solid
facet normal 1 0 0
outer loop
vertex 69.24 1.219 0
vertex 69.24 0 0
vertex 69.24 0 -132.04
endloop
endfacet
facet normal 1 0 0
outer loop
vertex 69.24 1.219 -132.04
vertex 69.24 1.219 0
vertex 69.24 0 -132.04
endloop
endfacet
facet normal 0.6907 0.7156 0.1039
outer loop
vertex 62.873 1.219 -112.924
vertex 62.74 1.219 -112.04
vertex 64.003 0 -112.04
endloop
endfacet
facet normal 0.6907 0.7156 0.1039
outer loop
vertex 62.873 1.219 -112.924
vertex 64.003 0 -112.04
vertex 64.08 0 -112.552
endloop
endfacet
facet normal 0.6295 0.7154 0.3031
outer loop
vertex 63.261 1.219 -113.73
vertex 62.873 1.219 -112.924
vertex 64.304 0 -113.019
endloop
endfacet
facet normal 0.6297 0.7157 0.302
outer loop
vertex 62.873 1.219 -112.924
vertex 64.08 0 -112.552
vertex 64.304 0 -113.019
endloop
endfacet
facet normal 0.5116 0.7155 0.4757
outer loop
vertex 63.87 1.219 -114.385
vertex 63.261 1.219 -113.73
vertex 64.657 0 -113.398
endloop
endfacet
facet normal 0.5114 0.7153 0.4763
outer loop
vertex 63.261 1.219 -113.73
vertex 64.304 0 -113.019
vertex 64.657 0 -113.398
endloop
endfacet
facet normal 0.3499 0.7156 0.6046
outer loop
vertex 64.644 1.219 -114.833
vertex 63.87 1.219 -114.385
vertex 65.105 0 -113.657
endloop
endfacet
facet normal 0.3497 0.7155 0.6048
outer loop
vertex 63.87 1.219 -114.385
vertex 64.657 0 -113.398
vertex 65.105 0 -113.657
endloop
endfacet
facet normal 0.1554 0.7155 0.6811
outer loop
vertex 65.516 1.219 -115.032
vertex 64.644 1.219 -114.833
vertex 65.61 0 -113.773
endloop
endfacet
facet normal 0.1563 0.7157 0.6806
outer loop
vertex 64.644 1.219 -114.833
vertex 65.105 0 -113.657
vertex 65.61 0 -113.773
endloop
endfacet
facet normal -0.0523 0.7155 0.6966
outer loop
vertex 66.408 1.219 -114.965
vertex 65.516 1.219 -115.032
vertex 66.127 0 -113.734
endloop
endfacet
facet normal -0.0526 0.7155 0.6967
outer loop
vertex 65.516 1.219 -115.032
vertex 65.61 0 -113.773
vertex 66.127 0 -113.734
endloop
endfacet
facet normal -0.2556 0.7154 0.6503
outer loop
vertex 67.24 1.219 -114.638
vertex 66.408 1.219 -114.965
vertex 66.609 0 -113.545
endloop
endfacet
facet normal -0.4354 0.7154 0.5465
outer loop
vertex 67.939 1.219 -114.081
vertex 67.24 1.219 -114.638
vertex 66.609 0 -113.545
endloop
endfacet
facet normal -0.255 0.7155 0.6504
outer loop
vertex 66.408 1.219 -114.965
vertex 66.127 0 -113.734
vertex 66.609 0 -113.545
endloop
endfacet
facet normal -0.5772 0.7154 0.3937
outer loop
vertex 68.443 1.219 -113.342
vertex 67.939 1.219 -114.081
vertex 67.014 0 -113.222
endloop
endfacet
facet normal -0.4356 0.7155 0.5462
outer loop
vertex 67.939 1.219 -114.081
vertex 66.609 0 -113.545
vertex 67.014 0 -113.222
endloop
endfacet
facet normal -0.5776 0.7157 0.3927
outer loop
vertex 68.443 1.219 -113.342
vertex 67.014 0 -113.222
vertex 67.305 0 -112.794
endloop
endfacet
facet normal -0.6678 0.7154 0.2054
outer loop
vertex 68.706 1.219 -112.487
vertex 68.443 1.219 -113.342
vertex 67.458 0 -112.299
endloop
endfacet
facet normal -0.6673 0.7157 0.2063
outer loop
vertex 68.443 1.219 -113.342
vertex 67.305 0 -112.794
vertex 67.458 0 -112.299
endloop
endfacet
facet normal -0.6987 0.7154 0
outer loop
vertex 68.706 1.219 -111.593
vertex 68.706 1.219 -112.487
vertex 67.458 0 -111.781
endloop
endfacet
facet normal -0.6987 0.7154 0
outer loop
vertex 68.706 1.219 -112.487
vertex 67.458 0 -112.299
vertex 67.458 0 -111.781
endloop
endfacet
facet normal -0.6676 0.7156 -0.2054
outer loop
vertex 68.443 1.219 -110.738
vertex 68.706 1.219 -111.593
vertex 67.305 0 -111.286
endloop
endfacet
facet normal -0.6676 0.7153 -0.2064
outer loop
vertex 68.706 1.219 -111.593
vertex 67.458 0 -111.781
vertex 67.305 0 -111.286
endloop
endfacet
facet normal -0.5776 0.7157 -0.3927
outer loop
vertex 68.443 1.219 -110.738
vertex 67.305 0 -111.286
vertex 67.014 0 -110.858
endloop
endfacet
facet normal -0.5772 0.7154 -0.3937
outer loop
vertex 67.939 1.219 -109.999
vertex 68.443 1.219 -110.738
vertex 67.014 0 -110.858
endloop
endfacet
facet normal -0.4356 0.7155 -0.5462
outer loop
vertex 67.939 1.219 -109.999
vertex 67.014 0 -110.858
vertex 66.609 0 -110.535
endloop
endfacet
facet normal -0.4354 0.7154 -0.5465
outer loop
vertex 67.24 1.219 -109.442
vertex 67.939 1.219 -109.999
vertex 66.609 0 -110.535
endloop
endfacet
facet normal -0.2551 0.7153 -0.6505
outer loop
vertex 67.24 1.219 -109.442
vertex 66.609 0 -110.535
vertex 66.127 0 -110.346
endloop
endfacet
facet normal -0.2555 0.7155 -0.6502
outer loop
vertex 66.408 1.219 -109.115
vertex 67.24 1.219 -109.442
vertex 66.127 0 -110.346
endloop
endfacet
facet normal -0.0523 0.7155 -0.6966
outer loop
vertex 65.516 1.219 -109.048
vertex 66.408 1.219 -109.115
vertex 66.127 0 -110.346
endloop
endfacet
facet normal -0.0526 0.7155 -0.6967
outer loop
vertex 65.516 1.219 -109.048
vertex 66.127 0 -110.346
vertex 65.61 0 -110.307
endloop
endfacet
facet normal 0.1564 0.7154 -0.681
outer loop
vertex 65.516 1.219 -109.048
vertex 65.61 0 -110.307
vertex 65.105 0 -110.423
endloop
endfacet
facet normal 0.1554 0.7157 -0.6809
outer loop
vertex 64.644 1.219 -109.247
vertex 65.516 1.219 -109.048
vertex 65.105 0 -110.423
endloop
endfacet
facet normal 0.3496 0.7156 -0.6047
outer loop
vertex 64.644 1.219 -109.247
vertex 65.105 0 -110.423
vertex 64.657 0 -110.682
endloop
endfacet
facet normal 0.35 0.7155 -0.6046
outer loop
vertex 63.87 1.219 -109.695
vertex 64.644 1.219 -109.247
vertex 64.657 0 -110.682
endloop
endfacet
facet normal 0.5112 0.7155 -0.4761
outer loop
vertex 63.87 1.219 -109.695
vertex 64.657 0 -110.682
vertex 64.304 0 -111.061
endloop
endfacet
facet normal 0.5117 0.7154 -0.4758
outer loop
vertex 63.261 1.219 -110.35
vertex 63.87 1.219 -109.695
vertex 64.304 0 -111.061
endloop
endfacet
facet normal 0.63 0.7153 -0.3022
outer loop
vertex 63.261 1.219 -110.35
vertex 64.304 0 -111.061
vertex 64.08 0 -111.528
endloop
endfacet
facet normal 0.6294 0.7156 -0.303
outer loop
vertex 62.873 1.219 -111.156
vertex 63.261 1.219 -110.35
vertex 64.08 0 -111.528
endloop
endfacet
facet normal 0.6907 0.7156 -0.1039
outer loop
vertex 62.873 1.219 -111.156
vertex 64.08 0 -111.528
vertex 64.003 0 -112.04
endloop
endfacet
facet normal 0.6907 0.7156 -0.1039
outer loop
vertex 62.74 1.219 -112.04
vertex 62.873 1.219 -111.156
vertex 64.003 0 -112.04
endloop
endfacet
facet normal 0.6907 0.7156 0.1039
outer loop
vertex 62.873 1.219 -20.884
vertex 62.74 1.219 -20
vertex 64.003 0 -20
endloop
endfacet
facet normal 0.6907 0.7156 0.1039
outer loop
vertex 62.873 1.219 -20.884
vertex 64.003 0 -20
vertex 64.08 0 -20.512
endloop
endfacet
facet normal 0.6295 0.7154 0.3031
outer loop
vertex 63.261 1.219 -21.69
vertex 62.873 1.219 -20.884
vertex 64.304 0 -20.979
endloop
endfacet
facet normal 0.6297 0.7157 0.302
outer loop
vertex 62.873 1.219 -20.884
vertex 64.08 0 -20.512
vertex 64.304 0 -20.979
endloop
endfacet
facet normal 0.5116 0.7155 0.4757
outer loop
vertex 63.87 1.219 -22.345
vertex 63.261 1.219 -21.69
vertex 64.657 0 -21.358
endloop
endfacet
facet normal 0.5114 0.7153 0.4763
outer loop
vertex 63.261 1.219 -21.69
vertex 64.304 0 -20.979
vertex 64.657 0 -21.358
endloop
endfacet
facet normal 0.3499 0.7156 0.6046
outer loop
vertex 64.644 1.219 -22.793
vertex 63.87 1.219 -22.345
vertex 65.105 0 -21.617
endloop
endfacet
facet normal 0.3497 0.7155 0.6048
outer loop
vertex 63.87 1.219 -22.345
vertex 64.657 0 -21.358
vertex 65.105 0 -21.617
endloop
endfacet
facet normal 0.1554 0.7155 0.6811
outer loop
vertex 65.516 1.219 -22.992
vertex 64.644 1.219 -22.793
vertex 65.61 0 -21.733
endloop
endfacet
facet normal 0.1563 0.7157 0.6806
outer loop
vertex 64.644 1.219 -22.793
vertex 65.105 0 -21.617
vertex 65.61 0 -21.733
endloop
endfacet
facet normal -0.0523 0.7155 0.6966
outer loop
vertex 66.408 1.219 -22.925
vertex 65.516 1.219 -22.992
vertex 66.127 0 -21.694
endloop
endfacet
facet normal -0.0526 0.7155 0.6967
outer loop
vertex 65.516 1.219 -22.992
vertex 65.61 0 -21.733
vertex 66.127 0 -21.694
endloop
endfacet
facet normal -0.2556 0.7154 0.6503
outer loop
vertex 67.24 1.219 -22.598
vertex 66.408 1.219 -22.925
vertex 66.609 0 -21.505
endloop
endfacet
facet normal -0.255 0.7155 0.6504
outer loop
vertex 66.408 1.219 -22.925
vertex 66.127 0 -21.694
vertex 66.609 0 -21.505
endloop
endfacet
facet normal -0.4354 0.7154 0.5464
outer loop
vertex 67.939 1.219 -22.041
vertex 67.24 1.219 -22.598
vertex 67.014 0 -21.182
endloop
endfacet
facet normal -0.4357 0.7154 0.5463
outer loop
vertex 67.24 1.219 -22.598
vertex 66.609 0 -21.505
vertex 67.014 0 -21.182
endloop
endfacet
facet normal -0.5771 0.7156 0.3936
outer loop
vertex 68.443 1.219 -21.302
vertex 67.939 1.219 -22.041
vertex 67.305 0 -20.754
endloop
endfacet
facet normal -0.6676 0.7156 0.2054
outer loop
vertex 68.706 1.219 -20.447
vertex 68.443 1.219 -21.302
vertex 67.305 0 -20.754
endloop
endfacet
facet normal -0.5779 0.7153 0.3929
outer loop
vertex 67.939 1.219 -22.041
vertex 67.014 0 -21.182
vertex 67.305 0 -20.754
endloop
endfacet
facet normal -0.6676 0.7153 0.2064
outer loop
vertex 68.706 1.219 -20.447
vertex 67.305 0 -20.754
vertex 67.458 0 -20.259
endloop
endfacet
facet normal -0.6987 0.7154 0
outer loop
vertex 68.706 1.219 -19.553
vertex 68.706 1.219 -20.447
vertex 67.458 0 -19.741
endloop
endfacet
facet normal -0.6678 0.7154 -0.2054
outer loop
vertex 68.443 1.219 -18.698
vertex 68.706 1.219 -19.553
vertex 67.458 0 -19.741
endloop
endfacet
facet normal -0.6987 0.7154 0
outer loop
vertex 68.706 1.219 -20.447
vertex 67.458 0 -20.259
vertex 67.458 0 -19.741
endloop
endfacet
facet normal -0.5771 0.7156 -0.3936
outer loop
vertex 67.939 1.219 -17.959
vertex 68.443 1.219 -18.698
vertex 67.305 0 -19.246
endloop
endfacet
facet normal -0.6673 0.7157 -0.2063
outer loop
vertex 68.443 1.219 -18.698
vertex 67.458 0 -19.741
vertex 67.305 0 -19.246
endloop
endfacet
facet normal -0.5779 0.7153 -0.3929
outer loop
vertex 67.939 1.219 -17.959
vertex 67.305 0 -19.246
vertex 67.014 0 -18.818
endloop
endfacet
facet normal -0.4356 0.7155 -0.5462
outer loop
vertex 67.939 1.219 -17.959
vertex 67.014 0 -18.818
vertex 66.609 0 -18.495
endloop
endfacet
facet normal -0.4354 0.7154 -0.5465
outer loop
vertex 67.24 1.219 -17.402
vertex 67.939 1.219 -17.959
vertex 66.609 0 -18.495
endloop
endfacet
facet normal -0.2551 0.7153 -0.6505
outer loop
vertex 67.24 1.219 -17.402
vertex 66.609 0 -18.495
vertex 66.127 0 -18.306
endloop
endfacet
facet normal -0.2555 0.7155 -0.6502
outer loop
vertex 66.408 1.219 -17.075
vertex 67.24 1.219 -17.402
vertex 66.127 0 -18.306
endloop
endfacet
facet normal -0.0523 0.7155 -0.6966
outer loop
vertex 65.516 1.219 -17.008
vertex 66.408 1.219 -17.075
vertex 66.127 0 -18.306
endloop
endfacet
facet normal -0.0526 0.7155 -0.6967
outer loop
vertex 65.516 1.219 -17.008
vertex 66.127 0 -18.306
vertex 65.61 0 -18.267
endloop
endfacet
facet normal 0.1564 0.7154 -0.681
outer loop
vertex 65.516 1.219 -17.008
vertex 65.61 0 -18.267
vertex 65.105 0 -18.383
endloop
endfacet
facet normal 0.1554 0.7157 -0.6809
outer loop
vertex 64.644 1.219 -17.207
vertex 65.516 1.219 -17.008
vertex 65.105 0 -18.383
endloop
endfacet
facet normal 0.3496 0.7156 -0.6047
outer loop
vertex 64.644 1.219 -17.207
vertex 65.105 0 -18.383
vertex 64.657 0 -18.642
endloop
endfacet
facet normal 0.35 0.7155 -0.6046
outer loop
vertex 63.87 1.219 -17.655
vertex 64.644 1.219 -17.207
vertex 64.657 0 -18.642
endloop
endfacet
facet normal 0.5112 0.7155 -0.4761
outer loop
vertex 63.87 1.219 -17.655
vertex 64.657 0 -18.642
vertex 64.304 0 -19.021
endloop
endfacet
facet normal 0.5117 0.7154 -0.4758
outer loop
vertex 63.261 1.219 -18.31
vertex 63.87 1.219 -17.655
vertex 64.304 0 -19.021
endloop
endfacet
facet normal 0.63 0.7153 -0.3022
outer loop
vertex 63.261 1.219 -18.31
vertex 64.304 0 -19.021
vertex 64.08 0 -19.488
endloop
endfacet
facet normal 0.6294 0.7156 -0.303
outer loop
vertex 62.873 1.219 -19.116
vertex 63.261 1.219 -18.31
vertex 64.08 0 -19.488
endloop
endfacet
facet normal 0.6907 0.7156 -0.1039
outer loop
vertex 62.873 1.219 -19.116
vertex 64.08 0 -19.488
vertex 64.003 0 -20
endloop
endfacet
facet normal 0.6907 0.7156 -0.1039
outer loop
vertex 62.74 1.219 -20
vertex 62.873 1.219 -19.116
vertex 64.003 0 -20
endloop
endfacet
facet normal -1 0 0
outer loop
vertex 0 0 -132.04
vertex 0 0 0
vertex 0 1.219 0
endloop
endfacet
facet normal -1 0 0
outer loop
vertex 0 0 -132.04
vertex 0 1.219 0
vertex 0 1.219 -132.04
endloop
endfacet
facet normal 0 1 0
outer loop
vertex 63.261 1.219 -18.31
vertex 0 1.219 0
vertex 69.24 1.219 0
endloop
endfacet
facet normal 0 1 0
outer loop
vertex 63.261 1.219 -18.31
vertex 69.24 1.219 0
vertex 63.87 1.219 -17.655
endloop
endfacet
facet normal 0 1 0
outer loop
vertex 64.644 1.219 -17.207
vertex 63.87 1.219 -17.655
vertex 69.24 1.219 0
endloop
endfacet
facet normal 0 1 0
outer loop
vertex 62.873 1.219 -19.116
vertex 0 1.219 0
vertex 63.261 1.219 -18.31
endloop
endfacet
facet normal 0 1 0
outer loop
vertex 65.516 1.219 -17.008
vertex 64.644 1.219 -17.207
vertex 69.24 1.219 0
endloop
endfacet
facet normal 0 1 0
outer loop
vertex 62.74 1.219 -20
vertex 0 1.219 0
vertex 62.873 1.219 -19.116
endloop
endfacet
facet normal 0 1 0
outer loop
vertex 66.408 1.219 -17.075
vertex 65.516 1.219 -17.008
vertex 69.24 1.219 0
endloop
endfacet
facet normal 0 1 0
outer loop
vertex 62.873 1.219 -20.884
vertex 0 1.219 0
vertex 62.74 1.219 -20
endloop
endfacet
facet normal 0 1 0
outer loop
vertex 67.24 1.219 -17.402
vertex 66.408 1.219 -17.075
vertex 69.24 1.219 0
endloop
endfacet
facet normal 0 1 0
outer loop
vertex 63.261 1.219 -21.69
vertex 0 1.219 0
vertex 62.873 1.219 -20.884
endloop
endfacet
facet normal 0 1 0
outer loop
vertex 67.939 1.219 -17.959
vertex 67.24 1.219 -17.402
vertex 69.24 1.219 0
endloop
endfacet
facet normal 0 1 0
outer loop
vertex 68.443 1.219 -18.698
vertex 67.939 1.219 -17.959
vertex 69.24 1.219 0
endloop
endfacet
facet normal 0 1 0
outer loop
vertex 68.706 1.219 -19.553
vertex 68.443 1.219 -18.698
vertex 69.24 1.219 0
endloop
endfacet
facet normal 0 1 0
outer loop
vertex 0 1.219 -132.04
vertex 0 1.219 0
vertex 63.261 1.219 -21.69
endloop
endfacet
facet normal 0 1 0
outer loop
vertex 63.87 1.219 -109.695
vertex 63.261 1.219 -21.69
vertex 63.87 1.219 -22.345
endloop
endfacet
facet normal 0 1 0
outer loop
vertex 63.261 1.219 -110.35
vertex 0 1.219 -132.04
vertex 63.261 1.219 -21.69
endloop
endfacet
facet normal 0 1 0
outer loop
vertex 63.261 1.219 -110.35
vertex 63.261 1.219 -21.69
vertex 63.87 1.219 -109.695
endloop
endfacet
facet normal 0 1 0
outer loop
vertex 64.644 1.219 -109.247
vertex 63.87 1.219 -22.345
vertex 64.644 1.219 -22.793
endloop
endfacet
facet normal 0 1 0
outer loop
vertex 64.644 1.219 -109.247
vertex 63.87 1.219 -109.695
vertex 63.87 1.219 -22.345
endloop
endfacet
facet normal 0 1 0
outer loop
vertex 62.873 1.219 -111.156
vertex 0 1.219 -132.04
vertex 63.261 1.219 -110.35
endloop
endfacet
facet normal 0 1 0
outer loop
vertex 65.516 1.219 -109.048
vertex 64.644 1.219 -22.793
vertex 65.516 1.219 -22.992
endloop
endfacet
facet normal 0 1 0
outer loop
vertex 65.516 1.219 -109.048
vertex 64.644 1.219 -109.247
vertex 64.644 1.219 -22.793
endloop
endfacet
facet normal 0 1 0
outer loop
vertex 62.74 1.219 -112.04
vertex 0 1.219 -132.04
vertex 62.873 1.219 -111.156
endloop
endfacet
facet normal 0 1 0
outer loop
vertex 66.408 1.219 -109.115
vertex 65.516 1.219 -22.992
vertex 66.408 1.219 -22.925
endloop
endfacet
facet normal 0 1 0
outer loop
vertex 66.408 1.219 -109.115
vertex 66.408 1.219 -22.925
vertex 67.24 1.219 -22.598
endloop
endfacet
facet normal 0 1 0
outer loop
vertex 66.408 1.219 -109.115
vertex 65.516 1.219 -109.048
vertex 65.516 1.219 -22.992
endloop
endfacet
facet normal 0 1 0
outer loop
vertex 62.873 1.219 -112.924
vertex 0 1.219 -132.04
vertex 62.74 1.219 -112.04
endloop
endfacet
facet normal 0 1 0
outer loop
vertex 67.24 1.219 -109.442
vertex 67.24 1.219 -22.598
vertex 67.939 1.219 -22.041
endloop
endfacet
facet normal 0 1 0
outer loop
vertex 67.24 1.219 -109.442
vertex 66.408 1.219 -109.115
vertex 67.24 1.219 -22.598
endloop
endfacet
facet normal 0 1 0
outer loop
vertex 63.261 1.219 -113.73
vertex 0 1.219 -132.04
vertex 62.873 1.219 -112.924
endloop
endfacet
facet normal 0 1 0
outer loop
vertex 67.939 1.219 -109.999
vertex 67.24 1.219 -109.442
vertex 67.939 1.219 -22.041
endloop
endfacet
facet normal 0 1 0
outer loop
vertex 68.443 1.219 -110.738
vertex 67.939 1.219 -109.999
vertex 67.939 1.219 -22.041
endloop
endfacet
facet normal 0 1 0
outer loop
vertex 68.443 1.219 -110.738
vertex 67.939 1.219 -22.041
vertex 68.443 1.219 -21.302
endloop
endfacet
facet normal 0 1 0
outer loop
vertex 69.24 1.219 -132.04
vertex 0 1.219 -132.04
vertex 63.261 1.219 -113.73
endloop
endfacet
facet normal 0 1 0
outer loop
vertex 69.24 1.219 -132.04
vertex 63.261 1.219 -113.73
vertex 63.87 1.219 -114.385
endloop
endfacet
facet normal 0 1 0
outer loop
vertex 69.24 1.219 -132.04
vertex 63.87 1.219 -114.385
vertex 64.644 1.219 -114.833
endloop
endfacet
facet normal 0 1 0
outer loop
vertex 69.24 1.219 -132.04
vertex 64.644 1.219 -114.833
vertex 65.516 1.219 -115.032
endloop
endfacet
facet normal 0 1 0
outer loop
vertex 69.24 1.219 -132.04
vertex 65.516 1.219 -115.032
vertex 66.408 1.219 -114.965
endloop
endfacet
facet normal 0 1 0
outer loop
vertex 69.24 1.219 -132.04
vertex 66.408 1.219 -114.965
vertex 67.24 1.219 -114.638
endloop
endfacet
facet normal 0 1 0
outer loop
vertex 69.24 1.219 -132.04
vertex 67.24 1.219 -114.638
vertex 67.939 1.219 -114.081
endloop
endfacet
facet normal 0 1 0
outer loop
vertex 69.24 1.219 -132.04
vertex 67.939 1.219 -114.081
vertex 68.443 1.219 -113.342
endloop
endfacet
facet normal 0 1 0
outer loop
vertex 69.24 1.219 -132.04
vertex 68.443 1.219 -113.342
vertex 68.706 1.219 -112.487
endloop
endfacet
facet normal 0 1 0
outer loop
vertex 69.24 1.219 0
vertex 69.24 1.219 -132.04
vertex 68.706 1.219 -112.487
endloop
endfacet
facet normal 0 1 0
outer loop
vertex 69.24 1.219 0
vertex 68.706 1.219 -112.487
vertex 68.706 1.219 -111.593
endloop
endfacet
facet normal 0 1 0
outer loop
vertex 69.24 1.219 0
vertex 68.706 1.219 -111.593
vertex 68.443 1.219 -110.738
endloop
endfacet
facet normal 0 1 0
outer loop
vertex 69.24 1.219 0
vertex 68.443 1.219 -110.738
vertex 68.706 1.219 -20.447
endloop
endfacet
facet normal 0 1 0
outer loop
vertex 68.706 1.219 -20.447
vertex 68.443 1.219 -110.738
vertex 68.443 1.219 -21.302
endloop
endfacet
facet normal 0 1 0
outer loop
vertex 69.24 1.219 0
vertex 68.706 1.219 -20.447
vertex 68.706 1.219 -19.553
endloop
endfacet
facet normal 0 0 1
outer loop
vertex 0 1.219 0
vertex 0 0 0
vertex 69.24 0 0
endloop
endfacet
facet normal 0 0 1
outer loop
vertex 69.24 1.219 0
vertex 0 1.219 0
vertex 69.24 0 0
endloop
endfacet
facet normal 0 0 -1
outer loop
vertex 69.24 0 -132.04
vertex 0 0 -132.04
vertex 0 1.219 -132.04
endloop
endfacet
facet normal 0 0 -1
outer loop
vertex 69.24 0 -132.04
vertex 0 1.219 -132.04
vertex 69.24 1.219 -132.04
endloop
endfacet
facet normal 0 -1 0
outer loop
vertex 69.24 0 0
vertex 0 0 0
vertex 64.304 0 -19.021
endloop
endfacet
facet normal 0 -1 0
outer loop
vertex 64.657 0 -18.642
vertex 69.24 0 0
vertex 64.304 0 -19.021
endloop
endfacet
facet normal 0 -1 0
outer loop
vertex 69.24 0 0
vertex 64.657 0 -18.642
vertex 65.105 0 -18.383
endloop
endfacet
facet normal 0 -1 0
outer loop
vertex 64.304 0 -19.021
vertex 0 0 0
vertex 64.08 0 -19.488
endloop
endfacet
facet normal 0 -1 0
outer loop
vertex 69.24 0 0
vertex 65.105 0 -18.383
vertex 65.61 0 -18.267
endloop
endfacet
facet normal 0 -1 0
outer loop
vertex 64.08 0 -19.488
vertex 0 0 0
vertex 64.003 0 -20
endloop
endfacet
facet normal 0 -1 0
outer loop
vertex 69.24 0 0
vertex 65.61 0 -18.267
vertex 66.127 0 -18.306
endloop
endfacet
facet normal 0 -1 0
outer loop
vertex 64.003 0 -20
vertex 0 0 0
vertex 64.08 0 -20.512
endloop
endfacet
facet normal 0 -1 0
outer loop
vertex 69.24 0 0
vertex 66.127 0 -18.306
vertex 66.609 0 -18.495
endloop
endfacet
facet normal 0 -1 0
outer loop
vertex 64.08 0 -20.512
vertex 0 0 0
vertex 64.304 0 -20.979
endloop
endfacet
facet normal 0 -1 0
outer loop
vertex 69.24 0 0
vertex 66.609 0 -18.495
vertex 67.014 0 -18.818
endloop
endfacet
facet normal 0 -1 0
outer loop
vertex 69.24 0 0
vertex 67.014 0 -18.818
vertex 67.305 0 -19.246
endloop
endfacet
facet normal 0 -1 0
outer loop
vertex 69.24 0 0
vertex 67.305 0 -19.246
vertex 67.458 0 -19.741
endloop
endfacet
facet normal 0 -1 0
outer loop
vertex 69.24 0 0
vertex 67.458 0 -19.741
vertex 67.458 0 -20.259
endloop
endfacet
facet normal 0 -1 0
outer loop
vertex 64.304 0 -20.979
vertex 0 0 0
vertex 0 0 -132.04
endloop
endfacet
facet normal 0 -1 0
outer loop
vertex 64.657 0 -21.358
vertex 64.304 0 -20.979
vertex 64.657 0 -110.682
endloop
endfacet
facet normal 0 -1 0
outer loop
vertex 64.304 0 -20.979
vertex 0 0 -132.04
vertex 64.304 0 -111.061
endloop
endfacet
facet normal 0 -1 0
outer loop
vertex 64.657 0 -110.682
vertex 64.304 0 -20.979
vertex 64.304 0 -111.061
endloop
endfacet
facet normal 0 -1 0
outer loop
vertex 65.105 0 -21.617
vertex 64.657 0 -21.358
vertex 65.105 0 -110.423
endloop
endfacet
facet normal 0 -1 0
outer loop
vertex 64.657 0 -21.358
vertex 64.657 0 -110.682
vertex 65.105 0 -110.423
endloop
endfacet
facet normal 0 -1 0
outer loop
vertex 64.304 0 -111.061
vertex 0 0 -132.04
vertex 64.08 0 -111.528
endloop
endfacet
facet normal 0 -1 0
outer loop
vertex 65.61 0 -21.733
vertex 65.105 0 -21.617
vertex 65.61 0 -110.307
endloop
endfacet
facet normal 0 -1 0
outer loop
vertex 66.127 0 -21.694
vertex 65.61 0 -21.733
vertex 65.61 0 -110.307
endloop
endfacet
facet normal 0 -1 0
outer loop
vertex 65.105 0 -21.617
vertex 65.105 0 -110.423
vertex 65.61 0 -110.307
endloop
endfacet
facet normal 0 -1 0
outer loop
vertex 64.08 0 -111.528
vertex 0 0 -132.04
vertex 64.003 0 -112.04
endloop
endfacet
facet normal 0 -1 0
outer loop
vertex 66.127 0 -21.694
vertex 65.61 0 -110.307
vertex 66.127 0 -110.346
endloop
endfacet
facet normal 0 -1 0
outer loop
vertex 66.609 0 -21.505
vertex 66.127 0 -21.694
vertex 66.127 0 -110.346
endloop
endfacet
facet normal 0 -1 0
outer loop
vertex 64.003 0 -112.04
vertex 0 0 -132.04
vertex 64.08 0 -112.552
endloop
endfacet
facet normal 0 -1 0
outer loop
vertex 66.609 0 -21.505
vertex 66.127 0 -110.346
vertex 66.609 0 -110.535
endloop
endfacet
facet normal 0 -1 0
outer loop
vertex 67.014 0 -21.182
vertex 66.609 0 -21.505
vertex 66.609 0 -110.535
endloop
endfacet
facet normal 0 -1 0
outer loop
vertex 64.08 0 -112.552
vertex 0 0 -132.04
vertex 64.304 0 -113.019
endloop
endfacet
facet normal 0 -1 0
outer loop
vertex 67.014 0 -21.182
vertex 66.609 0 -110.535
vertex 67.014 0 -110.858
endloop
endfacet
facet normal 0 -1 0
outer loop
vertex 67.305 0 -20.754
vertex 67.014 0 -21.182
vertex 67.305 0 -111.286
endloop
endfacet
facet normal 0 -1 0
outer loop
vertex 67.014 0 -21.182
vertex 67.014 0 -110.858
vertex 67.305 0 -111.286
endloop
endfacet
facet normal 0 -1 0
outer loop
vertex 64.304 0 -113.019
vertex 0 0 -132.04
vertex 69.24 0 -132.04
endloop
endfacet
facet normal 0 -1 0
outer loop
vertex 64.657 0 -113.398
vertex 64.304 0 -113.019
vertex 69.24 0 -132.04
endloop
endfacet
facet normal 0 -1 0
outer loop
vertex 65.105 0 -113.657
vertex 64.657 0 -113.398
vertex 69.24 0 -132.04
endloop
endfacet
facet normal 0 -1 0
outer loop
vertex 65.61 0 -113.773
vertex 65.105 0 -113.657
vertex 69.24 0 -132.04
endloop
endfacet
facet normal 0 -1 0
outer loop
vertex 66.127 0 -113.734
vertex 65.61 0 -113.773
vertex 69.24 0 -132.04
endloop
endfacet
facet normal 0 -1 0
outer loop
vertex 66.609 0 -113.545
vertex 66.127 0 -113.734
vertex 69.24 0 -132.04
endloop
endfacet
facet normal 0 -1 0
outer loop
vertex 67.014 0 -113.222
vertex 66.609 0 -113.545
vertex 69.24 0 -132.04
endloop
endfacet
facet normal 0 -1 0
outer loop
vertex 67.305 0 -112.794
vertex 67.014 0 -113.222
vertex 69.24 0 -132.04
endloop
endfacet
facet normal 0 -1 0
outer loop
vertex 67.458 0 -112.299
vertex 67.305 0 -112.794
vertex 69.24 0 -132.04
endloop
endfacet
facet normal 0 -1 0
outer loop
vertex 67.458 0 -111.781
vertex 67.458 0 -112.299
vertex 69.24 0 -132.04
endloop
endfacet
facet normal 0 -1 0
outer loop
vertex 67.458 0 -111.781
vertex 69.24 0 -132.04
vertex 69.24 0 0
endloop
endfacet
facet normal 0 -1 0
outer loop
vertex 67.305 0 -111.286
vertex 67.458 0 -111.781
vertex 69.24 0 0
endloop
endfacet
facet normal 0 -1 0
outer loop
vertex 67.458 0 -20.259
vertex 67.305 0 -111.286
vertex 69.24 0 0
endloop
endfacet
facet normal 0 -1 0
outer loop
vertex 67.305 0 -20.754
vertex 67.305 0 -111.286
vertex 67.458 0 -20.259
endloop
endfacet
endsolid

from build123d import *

# Parameters (mm, degrees)
SKETCH1_W                                            = 69.24
SKETCH1_H                                            = 132.04
BOSS_EXTRUDE1_DEPTH                                  = 1.2192
CSK_FOR_M3_CROSS_COUNTERSUNK_HEAD_SCREW1_D           = 3.4
CSK_FOR_M3_CROSS_COUNTERSUNK_HEAD_SCREW1_DEPTH       = 70.76
CSK_FOR_M3_CROSS_COUNTERSUNK_HEAD_SCREW1_CSINK_D     = 6
CSK_FOR_M3_CROSS_COUNTERSUNK_HEAD_SCREW1_CSINK_ANGLE = 92
CSK_FOR_M3_CROSS_COUNTERSUNK_HEAD_SCREW1_TIP         = 1.021463052


with BuildPart() as part:
    # Sketch1 → Boss-Extrude1 (new body)
    with BuildSketch(Plane(origin=(0, 0, 0), x_dir=(1, 0, 0), z_dir=(0, 1, 0))):
        with Locations((34.62, 66.02)):
            Rectangle(SKETCH1_W, SKETCH1_H)
    extrude(amount=BOSS_EXTRUDE1_DEPTH)

    # CSK for M3 Cross Countersunk Head Screw1
    with Locations(Plane(origin=(0, 1.2192, 0), x_dir=(1, 0, 0), z_dir=(0, 1, 0))):
        with Locations((65.74, 112.04), (65.74, 20)):
            CounterSinkHole(CSK_FOR_M3_CROSS_COUNTERSUNK_HEAD_SCREW1_D / 2, CSK_FOR_M3_CROSS_COUNTERSUNK_HEAD_SCREW1_CSINK_D / 2, depth=CSK_FOR_M3_CROSS_COUNTERSUNK_HEAD_SCREW1_DEPTH, counter_sink_angle=CSK_FOR_M3_CROSS_COUNTERSUNK_HEAD_SCREW1_CSINK_ANGLE)
            with Locations((0, 0, -(CSK_FOR_M3_CROSS_COUNTERSUNK_HEAD_SCREW1_DEPTH + CSK_FOR_M3_CROSS_COUNTERSUNK_HEAD_SCREW1_TIP / 2))):  # 118° drill point
                Cone(0, CSK_FOR_M3_CROSS_COUNTERSUNK_HEAD_SCREW1_D / 2, CSK_FOR_M3_CROSS_COUNTERSUNK_HEAD_SCREW1_TIP, mode=Mode.SUBTRACT)


solid = part.part
